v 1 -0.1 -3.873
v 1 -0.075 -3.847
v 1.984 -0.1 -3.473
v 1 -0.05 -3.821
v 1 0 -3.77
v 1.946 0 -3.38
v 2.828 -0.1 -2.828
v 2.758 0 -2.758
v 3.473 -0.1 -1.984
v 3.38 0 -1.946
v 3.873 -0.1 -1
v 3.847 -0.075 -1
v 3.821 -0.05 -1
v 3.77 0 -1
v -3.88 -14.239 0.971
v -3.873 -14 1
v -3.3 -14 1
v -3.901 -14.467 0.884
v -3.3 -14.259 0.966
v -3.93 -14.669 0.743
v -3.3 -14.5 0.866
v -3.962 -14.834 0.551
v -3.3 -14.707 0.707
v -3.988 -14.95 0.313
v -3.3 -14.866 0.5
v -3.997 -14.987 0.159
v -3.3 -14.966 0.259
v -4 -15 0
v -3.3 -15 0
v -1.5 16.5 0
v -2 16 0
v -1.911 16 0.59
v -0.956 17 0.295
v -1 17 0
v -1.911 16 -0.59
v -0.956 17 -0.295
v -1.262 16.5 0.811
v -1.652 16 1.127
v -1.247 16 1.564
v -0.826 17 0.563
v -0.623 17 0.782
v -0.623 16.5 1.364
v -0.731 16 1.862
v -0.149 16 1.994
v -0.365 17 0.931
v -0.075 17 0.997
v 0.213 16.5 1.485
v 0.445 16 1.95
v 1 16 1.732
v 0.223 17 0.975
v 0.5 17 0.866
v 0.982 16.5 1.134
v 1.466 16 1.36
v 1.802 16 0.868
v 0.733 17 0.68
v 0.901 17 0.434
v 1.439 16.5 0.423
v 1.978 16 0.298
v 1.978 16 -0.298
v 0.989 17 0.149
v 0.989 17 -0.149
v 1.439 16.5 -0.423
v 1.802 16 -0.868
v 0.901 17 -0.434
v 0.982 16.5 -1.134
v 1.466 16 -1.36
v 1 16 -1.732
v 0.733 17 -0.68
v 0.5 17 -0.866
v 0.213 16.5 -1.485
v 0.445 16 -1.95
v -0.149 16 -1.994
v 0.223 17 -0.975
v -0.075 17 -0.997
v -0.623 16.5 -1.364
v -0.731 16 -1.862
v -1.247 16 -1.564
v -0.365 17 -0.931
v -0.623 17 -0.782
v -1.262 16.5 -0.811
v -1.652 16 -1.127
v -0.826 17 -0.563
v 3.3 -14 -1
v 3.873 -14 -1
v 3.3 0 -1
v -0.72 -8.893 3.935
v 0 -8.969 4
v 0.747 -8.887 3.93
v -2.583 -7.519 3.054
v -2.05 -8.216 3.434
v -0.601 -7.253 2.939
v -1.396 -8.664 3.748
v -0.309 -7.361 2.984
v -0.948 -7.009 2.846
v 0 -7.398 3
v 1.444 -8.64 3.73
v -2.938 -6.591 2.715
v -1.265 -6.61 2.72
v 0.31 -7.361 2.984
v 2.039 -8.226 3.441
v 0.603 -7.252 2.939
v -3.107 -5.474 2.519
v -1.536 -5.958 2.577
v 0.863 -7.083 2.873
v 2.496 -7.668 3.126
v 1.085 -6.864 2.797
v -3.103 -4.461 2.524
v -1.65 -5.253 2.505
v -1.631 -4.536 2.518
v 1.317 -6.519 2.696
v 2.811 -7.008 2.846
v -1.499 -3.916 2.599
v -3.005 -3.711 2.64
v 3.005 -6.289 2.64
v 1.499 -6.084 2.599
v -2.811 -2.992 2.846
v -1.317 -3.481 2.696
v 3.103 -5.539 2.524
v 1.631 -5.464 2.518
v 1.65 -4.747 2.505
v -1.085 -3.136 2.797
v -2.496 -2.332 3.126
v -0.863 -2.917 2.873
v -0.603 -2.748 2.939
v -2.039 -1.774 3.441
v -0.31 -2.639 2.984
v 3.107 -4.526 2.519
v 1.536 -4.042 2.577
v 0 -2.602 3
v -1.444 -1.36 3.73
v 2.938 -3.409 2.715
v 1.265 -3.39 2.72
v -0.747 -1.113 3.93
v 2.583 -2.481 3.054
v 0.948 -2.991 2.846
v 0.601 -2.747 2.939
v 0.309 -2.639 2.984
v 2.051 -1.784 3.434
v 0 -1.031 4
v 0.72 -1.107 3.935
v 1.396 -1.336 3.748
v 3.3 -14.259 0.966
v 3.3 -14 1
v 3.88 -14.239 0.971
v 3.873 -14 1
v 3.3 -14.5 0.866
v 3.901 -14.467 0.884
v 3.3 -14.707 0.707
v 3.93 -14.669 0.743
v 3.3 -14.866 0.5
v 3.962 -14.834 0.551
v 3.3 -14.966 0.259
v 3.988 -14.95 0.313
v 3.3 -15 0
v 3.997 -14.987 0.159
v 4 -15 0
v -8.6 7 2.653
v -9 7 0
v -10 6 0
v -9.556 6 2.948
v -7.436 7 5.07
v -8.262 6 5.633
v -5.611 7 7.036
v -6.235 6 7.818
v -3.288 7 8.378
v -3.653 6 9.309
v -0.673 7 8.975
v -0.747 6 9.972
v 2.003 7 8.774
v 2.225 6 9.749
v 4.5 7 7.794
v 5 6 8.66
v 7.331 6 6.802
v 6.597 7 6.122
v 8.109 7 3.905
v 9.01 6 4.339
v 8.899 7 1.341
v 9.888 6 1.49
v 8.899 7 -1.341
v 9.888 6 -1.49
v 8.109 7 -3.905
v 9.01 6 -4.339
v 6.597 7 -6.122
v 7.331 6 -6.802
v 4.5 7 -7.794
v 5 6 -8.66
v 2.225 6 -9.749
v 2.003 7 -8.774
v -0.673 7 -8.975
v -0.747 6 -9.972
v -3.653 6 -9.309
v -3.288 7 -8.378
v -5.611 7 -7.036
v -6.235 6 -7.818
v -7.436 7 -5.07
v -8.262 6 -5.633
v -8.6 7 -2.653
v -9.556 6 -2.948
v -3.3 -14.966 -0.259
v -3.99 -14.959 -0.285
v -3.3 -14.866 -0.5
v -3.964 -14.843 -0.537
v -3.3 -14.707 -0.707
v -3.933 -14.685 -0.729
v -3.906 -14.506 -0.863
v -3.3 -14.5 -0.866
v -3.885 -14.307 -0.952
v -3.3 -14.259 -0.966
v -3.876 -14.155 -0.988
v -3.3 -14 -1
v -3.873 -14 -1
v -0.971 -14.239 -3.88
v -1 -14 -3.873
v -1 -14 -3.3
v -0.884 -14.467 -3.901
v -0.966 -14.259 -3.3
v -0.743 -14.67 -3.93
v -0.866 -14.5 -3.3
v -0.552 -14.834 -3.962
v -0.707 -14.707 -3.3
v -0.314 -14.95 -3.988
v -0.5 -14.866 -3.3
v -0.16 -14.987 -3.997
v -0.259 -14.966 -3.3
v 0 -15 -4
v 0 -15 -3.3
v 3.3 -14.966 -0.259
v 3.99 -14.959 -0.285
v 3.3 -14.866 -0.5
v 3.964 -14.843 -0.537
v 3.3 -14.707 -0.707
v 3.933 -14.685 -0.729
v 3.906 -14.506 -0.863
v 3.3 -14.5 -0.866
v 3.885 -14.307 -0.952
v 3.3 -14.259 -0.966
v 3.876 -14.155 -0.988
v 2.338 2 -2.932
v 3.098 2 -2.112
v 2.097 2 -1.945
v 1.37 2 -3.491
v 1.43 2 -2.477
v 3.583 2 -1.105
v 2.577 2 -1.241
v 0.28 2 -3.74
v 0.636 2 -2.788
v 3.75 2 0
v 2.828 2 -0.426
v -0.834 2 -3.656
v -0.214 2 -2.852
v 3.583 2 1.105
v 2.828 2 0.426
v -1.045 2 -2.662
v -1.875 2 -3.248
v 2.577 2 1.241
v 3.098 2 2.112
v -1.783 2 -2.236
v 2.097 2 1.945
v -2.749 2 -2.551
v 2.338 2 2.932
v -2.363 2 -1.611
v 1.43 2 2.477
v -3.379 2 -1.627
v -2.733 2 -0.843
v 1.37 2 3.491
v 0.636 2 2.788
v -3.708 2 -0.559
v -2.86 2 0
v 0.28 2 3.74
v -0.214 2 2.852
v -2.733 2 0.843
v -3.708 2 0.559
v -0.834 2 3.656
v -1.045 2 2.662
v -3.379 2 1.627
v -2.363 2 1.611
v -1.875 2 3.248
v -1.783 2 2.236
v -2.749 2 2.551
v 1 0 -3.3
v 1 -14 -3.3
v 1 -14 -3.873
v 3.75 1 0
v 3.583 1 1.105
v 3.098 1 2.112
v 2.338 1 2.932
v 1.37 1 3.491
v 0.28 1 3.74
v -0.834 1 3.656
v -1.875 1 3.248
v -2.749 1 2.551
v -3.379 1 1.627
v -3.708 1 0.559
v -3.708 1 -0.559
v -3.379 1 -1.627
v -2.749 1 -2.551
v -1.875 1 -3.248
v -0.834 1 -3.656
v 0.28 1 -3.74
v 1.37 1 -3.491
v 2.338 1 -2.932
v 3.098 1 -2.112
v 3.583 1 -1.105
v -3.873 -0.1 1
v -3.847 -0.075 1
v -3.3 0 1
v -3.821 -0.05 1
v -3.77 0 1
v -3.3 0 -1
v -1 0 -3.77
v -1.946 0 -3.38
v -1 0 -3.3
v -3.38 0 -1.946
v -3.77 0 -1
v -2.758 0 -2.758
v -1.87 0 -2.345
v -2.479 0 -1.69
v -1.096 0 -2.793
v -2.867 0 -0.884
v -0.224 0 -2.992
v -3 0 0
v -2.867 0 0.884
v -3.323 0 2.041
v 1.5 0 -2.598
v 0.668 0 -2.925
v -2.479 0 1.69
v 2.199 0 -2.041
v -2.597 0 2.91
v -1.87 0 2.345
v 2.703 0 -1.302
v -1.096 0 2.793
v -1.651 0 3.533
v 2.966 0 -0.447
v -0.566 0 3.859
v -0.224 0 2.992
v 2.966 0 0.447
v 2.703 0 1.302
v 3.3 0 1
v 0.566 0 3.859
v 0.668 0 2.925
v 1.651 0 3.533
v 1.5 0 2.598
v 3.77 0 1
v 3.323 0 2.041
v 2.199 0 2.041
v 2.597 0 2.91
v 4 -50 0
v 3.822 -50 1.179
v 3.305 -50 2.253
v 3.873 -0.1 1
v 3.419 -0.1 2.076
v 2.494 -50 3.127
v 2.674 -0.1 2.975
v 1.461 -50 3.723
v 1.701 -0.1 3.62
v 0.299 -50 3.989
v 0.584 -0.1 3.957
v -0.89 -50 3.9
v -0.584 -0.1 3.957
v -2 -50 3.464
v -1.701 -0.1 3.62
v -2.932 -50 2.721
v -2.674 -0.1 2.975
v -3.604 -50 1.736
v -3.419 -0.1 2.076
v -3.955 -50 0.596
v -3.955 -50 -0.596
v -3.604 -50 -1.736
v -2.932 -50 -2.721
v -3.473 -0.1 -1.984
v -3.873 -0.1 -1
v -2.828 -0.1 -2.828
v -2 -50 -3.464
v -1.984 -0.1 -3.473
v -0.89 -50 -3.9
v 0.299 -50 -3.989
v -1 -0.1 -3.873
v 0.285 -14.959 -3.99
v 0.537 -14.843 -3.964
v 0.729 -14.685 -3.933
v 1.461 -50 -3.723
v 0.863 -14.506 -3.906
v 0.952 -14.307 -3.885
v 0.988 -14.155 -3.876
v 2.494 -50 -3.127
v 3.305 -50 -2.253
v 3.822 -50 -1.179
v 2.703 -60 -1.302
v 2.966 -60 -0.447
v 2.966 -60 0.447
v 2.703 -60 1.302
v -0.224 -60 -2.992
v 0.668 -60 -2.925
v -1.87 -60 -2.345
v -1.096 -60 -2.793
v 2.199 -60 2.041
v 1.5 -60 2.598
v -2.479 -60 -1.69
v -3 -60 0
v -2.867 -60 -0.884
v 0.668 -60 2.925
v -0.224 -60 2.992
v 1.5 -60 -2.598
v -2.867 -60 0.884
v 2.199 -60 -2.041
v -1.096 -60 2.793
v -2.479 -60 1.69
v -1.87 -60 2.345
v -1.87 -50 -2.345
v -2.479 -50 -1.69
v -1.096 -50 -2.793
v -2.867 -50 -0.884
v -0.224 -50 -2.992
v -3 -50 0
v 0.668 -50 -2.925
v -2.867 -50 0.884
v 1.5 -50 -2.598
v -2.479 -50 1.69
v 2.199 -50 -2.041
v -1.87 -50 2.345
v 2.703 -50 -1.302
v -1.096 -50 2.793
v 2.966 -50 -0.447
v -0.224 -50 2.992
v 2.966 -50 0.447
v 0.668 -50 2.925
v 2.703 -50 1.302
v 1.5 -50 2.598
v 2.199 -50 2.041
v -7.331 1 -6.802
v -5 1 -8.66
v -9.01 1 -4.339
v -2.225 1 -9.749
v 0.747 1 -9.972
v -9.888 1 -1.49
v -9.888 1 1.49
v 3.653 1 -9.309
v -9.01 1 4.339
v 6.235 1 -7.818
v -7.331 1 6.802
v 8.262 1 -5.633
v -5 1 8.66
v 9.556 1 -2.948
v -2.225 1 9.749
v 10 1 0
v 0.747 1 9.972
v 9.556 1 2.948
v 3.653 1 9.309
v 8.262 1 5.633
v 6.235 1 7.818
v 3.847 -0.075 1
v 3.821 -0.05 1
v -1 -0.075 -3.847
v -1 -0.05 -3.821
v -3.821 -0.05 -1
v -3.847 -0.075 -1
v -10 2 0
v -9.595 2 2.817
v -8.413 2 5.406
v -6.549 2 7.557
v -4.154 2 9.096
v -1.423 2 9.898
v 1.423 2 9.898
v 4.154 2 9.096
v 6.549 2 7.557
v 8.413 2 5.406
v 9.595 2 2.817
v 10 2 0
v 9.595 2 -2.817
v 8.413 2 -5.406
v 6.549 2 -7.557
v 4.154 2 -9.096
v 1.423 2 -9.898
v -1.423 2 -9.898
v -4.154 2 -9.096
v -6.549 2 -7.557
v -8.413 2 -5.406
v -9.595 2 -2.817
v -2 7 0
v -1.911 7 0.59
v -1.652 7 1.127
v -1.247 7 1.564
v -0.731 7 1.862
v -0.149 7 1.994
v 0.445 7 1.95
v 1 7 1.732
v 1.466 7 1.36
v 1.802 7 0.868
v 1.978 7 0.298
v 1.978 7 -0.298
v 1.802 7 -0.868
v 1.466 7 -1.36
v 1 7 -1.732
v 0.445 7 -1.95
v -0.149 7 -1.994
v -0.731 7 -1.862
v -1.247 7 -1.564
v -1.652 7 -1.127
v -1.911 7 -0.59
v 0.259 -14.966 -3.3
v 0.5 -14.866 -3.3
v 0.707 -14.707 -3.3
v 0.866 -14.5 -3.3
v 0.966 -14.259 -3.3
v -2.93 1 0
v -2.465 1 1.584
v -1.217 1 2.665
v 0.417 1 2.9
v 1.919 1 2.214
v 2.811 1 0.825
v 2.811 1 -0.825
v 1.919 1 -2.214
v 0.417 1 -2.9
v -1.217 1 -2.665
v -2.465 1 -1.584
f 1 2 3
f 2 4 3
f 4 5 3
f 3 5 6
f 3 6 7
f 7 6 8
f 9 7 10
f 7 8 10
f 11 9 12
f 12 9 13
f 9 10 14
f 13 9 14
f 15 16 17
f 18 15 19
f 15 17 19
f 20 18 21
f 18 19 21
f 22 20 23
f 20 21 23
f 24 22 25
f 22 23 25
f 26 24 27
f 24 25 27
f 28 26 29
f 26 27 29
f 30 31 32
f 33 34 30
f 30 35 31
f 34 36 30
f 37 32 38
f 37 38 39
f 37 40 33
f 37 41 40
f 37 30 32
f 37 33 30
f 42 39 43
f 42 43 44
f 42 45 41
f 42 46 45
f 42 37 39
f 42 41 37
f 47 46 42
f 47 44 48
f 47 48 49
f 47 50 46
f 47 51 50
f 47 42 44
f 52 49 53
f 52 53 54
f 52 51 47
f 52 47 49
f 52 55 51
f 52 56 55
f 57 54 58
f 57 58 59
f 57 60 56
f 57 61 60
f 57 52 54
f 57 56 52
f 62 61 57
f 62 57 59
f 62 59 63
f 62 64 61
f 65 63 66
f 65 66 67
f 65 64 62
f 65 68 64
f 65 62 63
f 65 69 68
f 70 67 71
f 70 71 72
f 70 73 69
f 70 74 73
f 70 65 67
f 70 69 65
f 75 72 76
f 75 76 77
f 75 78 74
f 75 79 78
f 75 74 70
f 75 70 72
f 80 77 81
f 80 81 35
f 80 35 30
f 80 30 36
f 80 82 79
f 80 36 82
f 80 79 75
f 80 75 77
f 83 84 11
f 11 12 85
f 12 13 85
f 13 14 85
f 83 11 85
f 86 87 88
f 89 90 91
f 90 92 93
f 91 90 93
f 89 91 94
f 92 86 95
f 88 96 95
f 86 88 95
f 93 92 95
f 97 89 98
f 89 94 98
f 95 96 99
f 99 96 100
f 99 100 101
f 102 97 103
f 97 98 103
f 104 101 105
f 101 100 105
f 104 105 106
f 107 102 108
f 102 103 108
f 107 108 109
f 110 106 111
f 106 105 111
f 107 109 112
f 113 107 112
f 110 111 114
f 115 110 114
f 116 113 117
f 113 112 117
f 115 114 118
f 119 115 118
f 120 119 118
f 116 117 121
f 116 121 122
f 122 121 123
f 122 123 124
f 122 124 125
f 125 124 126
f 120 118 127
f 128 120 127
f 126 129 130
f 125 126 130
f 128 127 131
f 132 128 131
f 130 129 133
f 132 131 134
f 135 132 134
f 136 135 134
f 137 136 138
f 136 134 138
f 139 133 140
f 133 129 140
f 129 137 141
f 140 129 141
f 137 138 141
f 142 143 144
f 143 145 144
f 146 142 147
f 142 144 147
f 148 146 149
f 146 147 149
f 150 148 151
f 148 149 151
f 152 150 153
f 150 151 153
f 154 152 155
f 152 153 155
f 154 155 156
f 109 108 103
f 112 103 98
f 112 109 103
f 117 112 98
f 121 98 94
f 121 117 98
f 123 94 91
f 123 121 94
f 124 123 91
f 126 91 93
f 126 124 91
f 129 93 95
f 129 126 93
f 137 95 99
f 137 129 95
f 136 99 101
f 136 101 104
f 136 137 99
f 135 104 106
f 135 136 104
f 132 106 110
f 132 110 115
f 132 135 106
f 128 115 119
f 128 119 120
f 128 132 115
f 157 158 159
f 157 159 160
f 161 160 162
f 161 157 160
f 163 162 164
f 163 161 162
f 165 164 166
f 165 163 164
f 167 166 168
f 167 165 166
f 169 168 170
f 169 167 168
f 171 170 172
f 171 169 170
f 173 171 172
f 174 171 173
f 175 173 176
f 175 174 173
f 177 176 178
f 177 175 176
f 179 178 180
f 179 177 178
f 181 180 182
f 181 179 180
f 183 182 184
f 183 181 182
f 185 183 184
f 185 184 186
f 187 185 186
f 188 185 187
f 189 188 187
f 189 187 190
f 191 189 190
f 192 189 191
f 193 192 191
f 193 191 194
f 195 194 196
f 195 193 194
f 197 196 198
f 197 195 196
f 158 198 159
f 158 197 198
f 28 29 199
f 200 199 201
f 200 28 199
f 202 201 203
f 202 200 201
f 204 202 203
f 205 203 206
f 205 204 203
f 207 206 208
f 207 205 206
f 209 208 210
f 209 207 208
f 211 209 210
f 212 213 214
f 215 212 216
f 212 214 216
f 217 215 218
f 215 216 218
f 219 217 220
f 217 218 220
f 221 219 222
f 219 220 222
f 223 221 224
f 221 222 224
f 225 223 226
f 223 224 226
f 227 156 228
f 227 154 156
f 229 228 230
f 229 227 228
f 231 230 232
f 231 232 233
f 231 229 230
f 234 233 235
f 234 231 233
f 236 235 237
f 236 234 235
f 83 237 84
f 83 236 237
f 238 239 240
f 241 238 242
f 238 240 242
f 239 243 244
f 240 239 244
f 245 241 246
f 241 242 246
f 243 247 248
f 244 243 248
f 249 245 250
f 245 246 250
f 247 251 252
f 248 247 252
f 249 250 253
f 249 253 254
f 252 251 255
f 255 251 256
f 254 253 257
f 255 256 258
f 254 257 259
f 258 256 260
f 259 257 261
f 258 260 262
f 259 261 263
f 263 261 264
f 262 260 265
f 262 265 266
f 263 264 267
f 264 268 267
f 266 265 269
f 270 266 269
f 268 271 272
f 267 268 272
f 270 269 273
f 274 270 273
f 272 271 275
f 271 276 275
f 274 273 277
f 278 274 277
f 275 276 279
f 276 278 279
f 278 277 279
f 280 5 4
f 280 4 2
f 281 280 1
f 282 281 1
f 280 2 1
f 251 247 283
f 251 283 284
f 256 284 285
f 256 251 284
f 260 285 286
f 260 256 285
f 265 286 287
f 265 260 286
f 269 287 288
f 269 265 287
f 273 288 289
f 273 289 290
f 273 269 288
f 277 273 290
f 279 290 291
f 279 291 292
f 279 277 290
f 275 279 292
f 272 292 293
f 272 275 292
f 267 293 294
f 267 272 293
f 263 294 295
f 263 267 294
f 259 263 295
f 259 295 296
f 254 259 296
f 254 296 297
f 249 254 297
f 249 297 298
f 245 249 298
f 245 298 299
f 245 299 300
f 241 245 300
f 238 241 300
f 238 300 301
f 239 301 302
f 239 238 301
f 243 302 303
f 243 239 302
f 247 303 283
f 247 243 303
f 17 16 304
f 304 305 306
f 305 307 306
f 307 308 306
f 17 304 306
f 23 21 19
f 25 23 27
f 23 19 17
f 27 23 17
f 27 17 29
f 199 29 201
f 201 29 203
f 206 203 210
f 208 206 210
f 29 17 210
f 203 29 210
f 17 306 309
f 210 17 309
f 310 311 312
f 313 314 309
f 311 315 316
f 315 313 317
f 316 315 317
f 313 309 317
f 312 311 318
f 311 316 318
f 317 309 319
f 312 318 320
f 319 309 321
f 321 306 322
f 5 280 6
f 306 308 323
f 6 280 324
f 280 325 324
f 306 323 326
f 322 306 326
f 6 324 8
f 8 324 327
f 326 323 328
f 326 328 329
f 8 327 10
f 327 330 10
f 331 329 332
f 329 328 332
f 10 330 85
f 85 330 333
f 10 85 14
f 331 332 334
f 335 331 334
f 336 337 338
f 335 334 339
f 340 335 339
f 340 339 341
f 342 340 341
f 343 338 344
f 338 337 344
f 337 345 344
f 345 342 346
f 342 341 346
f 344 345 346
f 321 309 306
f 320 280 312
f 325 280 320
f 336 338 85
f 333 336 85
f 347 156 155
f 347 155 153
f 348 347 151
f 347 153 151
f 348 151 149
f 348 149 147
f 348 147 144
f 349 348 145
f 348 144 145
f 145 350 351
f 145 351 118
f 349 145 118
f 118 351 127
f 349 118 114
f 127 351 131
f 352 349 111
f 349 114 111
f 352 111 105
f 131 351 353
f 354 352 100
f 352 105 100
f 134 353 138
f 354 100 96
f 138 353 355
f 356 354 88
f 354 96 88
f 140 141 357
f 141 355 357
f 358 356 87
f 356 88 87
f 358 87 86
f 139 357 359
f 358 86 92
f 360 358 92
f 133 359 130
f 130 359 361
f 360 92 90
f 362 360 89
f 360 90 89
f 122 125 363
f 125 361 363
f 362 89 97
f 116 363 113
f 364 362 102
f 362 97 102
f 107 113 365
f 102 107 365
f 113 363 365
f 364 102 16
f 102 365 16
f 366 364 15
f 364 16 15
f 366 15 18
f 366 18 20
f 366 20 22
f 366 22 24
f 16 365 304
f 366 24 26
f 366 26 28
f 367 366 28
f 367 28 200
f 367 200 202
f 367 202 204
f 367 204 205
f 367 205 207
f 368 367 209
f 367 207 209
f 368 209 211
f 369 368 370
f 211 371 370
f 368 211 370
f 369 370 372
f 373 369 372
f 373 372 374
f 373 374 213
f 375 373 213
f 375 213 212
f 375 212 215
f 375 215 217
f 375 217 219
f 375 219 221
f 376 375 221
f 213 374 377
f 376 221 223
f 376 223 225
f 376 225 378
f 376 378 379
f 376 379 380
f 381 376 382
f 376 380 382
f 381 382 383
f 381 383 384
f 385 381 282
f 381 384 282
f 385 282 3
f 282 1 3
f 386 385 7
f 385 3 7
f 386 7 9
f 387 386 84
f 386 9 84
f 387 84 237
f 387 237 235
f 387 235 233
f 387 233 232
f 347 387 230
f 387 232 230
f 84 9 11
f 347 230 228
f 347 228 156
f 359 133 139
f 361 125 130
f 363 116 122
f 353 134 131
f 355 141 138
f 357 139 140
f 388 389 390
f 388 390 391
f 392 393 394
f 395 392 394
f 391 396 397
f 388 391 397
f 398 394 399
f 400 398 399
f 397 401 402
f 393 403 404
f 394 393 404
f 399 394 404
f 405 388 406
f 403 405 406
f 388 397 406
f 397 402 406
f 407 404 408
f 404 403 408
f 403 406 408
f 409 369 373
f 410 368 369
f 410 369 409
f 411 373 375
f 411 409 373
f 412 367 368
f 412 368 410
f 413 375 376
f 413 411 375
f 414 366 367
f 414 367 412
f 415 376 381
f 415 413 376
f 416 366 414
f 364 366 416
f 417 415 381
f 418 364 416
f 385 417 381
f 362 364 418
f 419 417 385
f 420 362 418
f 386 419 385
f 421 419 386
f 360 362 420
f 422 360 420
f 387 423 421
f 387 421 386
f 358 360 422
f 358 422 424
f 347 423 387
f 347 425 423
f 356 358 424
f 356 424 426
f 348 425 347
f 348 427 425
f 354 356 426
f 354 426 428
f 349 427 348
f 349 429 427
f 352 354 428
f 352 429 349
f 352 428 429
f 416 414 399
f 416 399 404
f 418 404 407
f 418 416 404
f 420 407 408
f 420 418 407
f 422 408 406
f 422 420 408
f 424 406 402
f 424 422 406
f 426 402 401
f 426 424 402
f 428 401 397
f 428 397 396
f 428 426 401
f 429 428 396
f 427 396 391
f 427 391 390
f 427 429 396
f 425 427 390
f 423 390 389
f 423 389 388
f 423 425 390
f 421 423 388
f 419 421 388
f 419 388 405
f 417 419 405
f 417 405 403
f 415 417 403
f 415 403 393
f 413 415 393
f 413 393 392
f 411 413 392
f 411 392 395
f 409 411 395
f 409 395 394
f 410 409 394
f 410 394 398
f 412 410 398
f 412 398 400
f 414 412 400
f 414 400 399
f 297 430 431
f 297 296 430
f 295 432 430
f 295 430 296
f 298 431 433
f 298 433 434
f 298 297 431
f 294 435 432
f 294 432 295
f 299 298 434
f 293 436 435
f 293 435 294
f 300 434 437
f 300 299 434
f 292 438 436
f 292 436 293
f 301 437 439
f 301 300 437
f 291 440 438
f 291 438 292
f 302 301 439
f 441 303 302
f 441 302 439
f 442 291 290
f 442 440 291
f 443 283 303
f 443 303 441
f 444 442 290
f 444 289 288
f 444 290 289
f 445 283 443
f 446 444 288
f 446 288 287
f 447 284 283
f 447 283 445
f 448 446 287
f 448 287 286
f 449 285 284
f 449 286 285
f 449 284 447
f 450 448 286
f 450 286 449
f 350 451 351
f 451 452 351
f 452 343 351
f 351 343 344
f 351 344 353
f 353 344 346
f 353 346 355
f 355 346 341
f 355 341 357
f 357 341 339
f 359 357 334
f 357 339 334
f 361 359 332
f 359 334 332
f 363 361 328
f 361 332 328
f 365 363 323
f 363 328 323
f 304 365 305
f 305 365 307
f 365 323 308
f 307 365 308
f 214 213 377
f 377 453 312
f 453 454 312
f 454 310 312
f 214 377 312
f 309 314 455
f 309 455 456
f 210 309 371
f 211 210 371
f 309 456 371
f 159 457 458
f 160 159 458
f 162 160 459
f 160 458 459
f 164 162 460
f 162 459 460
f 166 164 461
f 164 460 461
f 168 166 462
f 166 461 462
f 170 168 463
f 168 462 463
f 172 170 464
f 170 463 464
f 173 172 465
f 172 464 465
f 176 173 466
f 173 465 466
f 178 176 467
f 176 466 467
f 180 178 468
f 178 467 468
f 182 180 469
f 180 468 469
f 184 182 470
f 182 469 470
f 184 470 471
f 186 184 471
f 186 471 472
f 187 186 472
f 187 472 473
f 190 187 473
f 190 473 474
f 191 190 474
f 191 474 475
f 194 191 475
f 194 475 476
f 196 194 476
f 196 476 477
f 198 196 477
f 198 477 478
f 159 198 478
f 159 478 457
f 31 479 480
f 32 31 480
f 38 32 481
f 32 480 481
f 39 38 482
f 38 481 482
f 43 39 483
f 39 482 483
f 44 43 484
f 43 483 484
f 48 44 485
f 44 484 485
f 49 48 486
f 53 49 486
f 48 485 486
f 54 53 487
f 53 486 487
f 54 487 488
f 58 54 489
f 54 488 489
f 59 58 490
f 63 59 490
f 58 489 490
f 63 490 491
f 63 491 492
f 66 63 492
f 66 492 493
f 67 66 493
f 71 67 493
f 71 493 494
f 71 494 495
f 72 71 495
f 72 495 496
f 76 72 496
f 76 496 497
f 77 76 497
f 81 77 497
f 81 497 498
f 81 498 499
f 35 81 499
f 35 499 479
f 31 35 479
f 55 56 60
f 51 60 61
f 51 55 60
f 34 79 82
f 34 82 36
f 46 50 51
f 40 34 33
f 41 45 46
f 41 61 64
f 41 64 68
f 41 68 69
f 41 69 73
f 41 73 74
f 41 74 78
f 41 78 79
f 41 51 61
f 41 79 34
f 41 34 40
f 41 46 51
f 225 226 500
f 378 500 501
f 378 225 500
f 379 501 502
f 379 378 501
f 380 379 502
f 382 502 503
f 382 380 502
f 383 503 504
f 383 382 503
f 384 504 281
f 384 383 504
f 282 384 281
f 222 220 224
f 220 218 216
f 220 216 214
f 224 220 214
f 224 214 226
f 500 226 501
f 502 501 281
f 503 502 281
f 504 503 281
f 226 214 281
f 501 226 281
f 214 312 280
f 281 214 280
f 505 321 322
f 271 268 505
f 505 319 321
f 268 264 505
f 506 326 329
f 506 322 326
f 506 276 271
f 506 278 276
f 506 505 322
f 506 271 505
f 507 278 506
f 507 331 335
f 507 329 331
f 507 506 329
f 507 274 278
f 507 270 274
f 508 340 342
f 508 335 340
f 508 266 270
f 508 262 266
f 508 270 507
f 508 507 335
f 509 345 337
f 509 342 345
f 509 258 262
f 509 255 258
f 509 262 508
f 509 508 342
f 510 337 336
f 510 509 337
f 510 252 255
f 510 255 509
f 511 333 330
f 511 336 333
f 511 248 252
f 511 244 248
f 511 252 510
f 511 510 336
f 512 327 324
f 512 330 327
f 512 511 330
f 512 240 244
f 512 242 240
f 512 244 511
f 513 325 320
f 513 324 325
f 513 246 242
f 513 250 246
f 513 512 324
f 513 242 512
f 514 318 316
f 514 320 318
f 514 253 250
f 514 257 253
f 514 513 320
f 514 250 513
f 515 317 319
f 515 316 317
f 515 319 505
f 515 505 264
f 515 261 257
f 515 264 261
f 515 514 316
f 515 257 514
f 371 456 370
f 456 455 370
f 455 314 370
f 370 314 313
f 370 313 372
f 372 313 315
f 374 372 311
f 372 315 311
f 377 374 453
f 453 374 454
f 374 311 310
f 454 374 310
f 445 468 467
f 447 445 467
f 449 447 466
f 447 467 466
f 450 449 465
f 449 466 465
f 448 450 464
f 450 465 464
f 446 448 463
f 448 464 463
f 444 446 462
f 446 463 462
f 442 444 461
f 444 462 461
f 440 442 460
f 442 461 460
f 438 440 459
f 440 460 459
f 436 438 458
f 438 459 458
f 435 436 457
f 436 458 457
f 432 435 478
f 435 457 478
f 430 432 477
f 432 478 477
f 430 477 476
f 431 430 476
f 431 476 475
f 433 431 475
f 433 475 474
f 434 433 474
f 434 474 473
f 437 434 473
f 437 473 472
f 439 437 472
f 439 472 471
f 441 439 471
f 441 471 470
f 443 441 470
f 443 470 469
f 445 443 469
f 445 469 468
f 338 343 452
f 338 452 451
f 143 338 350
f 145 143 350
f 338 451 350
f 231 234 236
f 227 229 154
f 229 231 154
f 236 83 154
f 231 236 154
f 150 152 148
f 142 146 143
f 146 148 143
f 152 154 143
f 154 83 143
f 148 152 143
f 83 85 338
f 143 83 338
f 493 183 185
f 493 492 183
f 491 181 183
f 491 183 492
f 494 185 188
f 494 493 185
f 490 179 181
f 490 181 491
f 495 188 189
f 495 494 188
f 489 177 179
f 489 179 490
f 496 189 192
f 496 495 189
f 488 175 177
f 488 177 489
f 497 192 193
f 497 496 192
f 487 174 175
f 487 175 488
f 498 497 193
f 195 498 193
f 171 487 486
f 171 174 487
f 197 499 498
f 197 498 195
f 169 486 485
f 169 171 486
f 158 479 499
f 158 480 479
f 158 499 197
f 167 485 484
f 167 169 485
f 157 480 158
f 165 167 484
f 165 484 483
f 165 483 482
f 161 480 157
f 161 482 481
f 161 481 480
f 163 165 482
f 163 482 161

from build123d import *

# Parameters (mm, degrees)
F0_R          = 4
F0_R_2        = 3
F1_DEPTH      = 50
F2_R          = 6
F3_DEPTH      = 25
F3_DEPTH_BACK = 25
F5_DEPTH      = 15
F6_SIZE       = 0.1
F7_R          = 0.9999
F8_R          = 3
F9_DEPTH      = 2
F9_DEPTH_BACK = 60
F12_R         = 2
F13_DEPTH     = 15
F14_SIZE      = 1
F15_R         = 10
F16_DEPTH     = 5
F17_R         = 10
F17_R_2       = 3.75
F18_DEPTH     = 1
F20_SIZE      = 1


# Not quite as in the source:
# - a fillet or chamfer that OpenCascade refuses, or shapes differently, is made with other operations: its cross-section is extruded or revolved along the edge and cut away or added
# - a fillet or chamfer is up to 0.001 mm smaller than in the source, because OpenCascade refuses the exact size


with BuildPart() as f1:
    # F0 (on Front) → F1 (new body)
    with BuildSketch(Plane.XZ):
        Circle(F0_R)
        Circle(F0_R_2, mode=Mode.SUBTRACT)
    extrude(amount=F1_DEPTH)

    # F2 (on Right) → F3 (cut, two sides)
    with BuildSketch(Plane.YZ) as f3_sk:
        with Locations((-5, 8.5)):
            Circle(F2_R)
    extrude(amount=-F3_DEPTH, mode=Mode.SUBTRACT)
    extrude(f3_sk.sketch, amount=F3_DEPTH_BACK, mode=Mode.SUBTRACT)

    # F4 (on face) → F5 (cut)
    with BuildSketch(Plane(origin=(0, 0, 0), x_dir=(-1, 0, 0), z_dir=(0, 1, 0))):
        Polygon((-4.3, 1), (-4.3, 0), (-4.3, -1), (-3.3, -1), (-3.3, 1), align=None)
        Polygon((1, -3.3), (-1, -3.3), (-1, -4.3), (0, -4.3), (1, -4.3), align=None)
        Polygon((3.3, 1), (3.3, -1), (4.3, -1), (4.3, 0), (4.3, 1), align=None)
    extrude(amount=-F5_DEPTH, mode=Mode.SUBTRACT)

    # F6
    f6_edges = [f1.edges().sort_by_distance(p)[0] for p in [
        (0, 0, 4),
        (2.828427, 0, -2.828427),
        (-2.828427, 0, -2.828427),
    ]]
    chamfer(f6_edges, length=F6_SIZE)

    # F7 (radius 1 in the source; OpenCascade refuses exactly that, so slightly less here)
    f7_edges = [f1.edges().sort_by_distance(p)[0] for p in [
        (3.586492, -15, 1),
        (3.586492, -15, -1),
        (1, -15, -3.586492),
        (-1, -15, -3.586492),
        (-3.586492, -15, -1),
        (-3.586492, -15, 1),
    ]]
    fillet(f7_edges, radius=F7_R)

    # F8 (on face) → F9 (join, two sides)
    with BuildSketch(Plane(origin=(0, 0, 0), x_dir=(-1, 0, 0), z_dir=(0, 1, 0))) as f9_sk:
        Circle(F8_R)
    extrude(amount=F9_DEPTH)
    extrude(f9_sk.sketch, amount=-F9_DEPTH_BACK)

    # F10: chamfer of 2 x 0.1398536239 on 1 edges, made by hand


with BuildPart() as f10_tool2:
    # F10_s3 → F10_t4 (revolve)
    with BuildSketch(Plane.XY):
        Polygon((-3, 0), (-2.8601463761, 2), (-3, 2), align=None)
    revolve(axis=Axis((0, 2, 0), (0, 1, 0)))

    split(bisect_by=Plane.XZ, keep=Keep.BOTTOM)


with BuildPart() as f1_1:
    add(f1.part)

    # F10_t1: cut F10_tool2
    add(f10_tool2.part, mode=Mode.SUBTRACT)

    # F12 (on face) → F13 (join)
    with BuildSketch(Plane(origin=(0, 2, 0), x_dir=(-1, 0, 0), z_dir=(0, 1, 0))):
        Circle(F12_R)
    extrude(amount=F13_DEPTH)

    # F14
    f14_edges = [f1_1.edges().sort_by_distance(p)[0] for p in [
        (2, 17, 0),
    ]]
    chamfer(f14_edges, length=F14_SIZE)

    # F15 (on face) → F16 (join)
    with BuildSketch(Plane(origin=(0, 2, 0), x_dir=(-1, 0, 0), z_dir=(0, 1, 0))):
        Circle(F15_R)
    extrude(amount=F16_DEPTH)

    # F17 (on face) → F18 (join)
    with BuildSketch(Plane.XZ.offset(-2)):
        Circle(F17_R)
        Circle(F17_R_2, mode=Mode.SUBTRACT)
    extrude(amount=F18_DEPTH)

    # F20
    f20_edges = [f1_1.edges().sort_by_distance(p)[0] for p in [
        (10, 7, 0),
    ]]
    chamfer(f20_edges, length=F20_SIZE)


solid = f1_1.part
